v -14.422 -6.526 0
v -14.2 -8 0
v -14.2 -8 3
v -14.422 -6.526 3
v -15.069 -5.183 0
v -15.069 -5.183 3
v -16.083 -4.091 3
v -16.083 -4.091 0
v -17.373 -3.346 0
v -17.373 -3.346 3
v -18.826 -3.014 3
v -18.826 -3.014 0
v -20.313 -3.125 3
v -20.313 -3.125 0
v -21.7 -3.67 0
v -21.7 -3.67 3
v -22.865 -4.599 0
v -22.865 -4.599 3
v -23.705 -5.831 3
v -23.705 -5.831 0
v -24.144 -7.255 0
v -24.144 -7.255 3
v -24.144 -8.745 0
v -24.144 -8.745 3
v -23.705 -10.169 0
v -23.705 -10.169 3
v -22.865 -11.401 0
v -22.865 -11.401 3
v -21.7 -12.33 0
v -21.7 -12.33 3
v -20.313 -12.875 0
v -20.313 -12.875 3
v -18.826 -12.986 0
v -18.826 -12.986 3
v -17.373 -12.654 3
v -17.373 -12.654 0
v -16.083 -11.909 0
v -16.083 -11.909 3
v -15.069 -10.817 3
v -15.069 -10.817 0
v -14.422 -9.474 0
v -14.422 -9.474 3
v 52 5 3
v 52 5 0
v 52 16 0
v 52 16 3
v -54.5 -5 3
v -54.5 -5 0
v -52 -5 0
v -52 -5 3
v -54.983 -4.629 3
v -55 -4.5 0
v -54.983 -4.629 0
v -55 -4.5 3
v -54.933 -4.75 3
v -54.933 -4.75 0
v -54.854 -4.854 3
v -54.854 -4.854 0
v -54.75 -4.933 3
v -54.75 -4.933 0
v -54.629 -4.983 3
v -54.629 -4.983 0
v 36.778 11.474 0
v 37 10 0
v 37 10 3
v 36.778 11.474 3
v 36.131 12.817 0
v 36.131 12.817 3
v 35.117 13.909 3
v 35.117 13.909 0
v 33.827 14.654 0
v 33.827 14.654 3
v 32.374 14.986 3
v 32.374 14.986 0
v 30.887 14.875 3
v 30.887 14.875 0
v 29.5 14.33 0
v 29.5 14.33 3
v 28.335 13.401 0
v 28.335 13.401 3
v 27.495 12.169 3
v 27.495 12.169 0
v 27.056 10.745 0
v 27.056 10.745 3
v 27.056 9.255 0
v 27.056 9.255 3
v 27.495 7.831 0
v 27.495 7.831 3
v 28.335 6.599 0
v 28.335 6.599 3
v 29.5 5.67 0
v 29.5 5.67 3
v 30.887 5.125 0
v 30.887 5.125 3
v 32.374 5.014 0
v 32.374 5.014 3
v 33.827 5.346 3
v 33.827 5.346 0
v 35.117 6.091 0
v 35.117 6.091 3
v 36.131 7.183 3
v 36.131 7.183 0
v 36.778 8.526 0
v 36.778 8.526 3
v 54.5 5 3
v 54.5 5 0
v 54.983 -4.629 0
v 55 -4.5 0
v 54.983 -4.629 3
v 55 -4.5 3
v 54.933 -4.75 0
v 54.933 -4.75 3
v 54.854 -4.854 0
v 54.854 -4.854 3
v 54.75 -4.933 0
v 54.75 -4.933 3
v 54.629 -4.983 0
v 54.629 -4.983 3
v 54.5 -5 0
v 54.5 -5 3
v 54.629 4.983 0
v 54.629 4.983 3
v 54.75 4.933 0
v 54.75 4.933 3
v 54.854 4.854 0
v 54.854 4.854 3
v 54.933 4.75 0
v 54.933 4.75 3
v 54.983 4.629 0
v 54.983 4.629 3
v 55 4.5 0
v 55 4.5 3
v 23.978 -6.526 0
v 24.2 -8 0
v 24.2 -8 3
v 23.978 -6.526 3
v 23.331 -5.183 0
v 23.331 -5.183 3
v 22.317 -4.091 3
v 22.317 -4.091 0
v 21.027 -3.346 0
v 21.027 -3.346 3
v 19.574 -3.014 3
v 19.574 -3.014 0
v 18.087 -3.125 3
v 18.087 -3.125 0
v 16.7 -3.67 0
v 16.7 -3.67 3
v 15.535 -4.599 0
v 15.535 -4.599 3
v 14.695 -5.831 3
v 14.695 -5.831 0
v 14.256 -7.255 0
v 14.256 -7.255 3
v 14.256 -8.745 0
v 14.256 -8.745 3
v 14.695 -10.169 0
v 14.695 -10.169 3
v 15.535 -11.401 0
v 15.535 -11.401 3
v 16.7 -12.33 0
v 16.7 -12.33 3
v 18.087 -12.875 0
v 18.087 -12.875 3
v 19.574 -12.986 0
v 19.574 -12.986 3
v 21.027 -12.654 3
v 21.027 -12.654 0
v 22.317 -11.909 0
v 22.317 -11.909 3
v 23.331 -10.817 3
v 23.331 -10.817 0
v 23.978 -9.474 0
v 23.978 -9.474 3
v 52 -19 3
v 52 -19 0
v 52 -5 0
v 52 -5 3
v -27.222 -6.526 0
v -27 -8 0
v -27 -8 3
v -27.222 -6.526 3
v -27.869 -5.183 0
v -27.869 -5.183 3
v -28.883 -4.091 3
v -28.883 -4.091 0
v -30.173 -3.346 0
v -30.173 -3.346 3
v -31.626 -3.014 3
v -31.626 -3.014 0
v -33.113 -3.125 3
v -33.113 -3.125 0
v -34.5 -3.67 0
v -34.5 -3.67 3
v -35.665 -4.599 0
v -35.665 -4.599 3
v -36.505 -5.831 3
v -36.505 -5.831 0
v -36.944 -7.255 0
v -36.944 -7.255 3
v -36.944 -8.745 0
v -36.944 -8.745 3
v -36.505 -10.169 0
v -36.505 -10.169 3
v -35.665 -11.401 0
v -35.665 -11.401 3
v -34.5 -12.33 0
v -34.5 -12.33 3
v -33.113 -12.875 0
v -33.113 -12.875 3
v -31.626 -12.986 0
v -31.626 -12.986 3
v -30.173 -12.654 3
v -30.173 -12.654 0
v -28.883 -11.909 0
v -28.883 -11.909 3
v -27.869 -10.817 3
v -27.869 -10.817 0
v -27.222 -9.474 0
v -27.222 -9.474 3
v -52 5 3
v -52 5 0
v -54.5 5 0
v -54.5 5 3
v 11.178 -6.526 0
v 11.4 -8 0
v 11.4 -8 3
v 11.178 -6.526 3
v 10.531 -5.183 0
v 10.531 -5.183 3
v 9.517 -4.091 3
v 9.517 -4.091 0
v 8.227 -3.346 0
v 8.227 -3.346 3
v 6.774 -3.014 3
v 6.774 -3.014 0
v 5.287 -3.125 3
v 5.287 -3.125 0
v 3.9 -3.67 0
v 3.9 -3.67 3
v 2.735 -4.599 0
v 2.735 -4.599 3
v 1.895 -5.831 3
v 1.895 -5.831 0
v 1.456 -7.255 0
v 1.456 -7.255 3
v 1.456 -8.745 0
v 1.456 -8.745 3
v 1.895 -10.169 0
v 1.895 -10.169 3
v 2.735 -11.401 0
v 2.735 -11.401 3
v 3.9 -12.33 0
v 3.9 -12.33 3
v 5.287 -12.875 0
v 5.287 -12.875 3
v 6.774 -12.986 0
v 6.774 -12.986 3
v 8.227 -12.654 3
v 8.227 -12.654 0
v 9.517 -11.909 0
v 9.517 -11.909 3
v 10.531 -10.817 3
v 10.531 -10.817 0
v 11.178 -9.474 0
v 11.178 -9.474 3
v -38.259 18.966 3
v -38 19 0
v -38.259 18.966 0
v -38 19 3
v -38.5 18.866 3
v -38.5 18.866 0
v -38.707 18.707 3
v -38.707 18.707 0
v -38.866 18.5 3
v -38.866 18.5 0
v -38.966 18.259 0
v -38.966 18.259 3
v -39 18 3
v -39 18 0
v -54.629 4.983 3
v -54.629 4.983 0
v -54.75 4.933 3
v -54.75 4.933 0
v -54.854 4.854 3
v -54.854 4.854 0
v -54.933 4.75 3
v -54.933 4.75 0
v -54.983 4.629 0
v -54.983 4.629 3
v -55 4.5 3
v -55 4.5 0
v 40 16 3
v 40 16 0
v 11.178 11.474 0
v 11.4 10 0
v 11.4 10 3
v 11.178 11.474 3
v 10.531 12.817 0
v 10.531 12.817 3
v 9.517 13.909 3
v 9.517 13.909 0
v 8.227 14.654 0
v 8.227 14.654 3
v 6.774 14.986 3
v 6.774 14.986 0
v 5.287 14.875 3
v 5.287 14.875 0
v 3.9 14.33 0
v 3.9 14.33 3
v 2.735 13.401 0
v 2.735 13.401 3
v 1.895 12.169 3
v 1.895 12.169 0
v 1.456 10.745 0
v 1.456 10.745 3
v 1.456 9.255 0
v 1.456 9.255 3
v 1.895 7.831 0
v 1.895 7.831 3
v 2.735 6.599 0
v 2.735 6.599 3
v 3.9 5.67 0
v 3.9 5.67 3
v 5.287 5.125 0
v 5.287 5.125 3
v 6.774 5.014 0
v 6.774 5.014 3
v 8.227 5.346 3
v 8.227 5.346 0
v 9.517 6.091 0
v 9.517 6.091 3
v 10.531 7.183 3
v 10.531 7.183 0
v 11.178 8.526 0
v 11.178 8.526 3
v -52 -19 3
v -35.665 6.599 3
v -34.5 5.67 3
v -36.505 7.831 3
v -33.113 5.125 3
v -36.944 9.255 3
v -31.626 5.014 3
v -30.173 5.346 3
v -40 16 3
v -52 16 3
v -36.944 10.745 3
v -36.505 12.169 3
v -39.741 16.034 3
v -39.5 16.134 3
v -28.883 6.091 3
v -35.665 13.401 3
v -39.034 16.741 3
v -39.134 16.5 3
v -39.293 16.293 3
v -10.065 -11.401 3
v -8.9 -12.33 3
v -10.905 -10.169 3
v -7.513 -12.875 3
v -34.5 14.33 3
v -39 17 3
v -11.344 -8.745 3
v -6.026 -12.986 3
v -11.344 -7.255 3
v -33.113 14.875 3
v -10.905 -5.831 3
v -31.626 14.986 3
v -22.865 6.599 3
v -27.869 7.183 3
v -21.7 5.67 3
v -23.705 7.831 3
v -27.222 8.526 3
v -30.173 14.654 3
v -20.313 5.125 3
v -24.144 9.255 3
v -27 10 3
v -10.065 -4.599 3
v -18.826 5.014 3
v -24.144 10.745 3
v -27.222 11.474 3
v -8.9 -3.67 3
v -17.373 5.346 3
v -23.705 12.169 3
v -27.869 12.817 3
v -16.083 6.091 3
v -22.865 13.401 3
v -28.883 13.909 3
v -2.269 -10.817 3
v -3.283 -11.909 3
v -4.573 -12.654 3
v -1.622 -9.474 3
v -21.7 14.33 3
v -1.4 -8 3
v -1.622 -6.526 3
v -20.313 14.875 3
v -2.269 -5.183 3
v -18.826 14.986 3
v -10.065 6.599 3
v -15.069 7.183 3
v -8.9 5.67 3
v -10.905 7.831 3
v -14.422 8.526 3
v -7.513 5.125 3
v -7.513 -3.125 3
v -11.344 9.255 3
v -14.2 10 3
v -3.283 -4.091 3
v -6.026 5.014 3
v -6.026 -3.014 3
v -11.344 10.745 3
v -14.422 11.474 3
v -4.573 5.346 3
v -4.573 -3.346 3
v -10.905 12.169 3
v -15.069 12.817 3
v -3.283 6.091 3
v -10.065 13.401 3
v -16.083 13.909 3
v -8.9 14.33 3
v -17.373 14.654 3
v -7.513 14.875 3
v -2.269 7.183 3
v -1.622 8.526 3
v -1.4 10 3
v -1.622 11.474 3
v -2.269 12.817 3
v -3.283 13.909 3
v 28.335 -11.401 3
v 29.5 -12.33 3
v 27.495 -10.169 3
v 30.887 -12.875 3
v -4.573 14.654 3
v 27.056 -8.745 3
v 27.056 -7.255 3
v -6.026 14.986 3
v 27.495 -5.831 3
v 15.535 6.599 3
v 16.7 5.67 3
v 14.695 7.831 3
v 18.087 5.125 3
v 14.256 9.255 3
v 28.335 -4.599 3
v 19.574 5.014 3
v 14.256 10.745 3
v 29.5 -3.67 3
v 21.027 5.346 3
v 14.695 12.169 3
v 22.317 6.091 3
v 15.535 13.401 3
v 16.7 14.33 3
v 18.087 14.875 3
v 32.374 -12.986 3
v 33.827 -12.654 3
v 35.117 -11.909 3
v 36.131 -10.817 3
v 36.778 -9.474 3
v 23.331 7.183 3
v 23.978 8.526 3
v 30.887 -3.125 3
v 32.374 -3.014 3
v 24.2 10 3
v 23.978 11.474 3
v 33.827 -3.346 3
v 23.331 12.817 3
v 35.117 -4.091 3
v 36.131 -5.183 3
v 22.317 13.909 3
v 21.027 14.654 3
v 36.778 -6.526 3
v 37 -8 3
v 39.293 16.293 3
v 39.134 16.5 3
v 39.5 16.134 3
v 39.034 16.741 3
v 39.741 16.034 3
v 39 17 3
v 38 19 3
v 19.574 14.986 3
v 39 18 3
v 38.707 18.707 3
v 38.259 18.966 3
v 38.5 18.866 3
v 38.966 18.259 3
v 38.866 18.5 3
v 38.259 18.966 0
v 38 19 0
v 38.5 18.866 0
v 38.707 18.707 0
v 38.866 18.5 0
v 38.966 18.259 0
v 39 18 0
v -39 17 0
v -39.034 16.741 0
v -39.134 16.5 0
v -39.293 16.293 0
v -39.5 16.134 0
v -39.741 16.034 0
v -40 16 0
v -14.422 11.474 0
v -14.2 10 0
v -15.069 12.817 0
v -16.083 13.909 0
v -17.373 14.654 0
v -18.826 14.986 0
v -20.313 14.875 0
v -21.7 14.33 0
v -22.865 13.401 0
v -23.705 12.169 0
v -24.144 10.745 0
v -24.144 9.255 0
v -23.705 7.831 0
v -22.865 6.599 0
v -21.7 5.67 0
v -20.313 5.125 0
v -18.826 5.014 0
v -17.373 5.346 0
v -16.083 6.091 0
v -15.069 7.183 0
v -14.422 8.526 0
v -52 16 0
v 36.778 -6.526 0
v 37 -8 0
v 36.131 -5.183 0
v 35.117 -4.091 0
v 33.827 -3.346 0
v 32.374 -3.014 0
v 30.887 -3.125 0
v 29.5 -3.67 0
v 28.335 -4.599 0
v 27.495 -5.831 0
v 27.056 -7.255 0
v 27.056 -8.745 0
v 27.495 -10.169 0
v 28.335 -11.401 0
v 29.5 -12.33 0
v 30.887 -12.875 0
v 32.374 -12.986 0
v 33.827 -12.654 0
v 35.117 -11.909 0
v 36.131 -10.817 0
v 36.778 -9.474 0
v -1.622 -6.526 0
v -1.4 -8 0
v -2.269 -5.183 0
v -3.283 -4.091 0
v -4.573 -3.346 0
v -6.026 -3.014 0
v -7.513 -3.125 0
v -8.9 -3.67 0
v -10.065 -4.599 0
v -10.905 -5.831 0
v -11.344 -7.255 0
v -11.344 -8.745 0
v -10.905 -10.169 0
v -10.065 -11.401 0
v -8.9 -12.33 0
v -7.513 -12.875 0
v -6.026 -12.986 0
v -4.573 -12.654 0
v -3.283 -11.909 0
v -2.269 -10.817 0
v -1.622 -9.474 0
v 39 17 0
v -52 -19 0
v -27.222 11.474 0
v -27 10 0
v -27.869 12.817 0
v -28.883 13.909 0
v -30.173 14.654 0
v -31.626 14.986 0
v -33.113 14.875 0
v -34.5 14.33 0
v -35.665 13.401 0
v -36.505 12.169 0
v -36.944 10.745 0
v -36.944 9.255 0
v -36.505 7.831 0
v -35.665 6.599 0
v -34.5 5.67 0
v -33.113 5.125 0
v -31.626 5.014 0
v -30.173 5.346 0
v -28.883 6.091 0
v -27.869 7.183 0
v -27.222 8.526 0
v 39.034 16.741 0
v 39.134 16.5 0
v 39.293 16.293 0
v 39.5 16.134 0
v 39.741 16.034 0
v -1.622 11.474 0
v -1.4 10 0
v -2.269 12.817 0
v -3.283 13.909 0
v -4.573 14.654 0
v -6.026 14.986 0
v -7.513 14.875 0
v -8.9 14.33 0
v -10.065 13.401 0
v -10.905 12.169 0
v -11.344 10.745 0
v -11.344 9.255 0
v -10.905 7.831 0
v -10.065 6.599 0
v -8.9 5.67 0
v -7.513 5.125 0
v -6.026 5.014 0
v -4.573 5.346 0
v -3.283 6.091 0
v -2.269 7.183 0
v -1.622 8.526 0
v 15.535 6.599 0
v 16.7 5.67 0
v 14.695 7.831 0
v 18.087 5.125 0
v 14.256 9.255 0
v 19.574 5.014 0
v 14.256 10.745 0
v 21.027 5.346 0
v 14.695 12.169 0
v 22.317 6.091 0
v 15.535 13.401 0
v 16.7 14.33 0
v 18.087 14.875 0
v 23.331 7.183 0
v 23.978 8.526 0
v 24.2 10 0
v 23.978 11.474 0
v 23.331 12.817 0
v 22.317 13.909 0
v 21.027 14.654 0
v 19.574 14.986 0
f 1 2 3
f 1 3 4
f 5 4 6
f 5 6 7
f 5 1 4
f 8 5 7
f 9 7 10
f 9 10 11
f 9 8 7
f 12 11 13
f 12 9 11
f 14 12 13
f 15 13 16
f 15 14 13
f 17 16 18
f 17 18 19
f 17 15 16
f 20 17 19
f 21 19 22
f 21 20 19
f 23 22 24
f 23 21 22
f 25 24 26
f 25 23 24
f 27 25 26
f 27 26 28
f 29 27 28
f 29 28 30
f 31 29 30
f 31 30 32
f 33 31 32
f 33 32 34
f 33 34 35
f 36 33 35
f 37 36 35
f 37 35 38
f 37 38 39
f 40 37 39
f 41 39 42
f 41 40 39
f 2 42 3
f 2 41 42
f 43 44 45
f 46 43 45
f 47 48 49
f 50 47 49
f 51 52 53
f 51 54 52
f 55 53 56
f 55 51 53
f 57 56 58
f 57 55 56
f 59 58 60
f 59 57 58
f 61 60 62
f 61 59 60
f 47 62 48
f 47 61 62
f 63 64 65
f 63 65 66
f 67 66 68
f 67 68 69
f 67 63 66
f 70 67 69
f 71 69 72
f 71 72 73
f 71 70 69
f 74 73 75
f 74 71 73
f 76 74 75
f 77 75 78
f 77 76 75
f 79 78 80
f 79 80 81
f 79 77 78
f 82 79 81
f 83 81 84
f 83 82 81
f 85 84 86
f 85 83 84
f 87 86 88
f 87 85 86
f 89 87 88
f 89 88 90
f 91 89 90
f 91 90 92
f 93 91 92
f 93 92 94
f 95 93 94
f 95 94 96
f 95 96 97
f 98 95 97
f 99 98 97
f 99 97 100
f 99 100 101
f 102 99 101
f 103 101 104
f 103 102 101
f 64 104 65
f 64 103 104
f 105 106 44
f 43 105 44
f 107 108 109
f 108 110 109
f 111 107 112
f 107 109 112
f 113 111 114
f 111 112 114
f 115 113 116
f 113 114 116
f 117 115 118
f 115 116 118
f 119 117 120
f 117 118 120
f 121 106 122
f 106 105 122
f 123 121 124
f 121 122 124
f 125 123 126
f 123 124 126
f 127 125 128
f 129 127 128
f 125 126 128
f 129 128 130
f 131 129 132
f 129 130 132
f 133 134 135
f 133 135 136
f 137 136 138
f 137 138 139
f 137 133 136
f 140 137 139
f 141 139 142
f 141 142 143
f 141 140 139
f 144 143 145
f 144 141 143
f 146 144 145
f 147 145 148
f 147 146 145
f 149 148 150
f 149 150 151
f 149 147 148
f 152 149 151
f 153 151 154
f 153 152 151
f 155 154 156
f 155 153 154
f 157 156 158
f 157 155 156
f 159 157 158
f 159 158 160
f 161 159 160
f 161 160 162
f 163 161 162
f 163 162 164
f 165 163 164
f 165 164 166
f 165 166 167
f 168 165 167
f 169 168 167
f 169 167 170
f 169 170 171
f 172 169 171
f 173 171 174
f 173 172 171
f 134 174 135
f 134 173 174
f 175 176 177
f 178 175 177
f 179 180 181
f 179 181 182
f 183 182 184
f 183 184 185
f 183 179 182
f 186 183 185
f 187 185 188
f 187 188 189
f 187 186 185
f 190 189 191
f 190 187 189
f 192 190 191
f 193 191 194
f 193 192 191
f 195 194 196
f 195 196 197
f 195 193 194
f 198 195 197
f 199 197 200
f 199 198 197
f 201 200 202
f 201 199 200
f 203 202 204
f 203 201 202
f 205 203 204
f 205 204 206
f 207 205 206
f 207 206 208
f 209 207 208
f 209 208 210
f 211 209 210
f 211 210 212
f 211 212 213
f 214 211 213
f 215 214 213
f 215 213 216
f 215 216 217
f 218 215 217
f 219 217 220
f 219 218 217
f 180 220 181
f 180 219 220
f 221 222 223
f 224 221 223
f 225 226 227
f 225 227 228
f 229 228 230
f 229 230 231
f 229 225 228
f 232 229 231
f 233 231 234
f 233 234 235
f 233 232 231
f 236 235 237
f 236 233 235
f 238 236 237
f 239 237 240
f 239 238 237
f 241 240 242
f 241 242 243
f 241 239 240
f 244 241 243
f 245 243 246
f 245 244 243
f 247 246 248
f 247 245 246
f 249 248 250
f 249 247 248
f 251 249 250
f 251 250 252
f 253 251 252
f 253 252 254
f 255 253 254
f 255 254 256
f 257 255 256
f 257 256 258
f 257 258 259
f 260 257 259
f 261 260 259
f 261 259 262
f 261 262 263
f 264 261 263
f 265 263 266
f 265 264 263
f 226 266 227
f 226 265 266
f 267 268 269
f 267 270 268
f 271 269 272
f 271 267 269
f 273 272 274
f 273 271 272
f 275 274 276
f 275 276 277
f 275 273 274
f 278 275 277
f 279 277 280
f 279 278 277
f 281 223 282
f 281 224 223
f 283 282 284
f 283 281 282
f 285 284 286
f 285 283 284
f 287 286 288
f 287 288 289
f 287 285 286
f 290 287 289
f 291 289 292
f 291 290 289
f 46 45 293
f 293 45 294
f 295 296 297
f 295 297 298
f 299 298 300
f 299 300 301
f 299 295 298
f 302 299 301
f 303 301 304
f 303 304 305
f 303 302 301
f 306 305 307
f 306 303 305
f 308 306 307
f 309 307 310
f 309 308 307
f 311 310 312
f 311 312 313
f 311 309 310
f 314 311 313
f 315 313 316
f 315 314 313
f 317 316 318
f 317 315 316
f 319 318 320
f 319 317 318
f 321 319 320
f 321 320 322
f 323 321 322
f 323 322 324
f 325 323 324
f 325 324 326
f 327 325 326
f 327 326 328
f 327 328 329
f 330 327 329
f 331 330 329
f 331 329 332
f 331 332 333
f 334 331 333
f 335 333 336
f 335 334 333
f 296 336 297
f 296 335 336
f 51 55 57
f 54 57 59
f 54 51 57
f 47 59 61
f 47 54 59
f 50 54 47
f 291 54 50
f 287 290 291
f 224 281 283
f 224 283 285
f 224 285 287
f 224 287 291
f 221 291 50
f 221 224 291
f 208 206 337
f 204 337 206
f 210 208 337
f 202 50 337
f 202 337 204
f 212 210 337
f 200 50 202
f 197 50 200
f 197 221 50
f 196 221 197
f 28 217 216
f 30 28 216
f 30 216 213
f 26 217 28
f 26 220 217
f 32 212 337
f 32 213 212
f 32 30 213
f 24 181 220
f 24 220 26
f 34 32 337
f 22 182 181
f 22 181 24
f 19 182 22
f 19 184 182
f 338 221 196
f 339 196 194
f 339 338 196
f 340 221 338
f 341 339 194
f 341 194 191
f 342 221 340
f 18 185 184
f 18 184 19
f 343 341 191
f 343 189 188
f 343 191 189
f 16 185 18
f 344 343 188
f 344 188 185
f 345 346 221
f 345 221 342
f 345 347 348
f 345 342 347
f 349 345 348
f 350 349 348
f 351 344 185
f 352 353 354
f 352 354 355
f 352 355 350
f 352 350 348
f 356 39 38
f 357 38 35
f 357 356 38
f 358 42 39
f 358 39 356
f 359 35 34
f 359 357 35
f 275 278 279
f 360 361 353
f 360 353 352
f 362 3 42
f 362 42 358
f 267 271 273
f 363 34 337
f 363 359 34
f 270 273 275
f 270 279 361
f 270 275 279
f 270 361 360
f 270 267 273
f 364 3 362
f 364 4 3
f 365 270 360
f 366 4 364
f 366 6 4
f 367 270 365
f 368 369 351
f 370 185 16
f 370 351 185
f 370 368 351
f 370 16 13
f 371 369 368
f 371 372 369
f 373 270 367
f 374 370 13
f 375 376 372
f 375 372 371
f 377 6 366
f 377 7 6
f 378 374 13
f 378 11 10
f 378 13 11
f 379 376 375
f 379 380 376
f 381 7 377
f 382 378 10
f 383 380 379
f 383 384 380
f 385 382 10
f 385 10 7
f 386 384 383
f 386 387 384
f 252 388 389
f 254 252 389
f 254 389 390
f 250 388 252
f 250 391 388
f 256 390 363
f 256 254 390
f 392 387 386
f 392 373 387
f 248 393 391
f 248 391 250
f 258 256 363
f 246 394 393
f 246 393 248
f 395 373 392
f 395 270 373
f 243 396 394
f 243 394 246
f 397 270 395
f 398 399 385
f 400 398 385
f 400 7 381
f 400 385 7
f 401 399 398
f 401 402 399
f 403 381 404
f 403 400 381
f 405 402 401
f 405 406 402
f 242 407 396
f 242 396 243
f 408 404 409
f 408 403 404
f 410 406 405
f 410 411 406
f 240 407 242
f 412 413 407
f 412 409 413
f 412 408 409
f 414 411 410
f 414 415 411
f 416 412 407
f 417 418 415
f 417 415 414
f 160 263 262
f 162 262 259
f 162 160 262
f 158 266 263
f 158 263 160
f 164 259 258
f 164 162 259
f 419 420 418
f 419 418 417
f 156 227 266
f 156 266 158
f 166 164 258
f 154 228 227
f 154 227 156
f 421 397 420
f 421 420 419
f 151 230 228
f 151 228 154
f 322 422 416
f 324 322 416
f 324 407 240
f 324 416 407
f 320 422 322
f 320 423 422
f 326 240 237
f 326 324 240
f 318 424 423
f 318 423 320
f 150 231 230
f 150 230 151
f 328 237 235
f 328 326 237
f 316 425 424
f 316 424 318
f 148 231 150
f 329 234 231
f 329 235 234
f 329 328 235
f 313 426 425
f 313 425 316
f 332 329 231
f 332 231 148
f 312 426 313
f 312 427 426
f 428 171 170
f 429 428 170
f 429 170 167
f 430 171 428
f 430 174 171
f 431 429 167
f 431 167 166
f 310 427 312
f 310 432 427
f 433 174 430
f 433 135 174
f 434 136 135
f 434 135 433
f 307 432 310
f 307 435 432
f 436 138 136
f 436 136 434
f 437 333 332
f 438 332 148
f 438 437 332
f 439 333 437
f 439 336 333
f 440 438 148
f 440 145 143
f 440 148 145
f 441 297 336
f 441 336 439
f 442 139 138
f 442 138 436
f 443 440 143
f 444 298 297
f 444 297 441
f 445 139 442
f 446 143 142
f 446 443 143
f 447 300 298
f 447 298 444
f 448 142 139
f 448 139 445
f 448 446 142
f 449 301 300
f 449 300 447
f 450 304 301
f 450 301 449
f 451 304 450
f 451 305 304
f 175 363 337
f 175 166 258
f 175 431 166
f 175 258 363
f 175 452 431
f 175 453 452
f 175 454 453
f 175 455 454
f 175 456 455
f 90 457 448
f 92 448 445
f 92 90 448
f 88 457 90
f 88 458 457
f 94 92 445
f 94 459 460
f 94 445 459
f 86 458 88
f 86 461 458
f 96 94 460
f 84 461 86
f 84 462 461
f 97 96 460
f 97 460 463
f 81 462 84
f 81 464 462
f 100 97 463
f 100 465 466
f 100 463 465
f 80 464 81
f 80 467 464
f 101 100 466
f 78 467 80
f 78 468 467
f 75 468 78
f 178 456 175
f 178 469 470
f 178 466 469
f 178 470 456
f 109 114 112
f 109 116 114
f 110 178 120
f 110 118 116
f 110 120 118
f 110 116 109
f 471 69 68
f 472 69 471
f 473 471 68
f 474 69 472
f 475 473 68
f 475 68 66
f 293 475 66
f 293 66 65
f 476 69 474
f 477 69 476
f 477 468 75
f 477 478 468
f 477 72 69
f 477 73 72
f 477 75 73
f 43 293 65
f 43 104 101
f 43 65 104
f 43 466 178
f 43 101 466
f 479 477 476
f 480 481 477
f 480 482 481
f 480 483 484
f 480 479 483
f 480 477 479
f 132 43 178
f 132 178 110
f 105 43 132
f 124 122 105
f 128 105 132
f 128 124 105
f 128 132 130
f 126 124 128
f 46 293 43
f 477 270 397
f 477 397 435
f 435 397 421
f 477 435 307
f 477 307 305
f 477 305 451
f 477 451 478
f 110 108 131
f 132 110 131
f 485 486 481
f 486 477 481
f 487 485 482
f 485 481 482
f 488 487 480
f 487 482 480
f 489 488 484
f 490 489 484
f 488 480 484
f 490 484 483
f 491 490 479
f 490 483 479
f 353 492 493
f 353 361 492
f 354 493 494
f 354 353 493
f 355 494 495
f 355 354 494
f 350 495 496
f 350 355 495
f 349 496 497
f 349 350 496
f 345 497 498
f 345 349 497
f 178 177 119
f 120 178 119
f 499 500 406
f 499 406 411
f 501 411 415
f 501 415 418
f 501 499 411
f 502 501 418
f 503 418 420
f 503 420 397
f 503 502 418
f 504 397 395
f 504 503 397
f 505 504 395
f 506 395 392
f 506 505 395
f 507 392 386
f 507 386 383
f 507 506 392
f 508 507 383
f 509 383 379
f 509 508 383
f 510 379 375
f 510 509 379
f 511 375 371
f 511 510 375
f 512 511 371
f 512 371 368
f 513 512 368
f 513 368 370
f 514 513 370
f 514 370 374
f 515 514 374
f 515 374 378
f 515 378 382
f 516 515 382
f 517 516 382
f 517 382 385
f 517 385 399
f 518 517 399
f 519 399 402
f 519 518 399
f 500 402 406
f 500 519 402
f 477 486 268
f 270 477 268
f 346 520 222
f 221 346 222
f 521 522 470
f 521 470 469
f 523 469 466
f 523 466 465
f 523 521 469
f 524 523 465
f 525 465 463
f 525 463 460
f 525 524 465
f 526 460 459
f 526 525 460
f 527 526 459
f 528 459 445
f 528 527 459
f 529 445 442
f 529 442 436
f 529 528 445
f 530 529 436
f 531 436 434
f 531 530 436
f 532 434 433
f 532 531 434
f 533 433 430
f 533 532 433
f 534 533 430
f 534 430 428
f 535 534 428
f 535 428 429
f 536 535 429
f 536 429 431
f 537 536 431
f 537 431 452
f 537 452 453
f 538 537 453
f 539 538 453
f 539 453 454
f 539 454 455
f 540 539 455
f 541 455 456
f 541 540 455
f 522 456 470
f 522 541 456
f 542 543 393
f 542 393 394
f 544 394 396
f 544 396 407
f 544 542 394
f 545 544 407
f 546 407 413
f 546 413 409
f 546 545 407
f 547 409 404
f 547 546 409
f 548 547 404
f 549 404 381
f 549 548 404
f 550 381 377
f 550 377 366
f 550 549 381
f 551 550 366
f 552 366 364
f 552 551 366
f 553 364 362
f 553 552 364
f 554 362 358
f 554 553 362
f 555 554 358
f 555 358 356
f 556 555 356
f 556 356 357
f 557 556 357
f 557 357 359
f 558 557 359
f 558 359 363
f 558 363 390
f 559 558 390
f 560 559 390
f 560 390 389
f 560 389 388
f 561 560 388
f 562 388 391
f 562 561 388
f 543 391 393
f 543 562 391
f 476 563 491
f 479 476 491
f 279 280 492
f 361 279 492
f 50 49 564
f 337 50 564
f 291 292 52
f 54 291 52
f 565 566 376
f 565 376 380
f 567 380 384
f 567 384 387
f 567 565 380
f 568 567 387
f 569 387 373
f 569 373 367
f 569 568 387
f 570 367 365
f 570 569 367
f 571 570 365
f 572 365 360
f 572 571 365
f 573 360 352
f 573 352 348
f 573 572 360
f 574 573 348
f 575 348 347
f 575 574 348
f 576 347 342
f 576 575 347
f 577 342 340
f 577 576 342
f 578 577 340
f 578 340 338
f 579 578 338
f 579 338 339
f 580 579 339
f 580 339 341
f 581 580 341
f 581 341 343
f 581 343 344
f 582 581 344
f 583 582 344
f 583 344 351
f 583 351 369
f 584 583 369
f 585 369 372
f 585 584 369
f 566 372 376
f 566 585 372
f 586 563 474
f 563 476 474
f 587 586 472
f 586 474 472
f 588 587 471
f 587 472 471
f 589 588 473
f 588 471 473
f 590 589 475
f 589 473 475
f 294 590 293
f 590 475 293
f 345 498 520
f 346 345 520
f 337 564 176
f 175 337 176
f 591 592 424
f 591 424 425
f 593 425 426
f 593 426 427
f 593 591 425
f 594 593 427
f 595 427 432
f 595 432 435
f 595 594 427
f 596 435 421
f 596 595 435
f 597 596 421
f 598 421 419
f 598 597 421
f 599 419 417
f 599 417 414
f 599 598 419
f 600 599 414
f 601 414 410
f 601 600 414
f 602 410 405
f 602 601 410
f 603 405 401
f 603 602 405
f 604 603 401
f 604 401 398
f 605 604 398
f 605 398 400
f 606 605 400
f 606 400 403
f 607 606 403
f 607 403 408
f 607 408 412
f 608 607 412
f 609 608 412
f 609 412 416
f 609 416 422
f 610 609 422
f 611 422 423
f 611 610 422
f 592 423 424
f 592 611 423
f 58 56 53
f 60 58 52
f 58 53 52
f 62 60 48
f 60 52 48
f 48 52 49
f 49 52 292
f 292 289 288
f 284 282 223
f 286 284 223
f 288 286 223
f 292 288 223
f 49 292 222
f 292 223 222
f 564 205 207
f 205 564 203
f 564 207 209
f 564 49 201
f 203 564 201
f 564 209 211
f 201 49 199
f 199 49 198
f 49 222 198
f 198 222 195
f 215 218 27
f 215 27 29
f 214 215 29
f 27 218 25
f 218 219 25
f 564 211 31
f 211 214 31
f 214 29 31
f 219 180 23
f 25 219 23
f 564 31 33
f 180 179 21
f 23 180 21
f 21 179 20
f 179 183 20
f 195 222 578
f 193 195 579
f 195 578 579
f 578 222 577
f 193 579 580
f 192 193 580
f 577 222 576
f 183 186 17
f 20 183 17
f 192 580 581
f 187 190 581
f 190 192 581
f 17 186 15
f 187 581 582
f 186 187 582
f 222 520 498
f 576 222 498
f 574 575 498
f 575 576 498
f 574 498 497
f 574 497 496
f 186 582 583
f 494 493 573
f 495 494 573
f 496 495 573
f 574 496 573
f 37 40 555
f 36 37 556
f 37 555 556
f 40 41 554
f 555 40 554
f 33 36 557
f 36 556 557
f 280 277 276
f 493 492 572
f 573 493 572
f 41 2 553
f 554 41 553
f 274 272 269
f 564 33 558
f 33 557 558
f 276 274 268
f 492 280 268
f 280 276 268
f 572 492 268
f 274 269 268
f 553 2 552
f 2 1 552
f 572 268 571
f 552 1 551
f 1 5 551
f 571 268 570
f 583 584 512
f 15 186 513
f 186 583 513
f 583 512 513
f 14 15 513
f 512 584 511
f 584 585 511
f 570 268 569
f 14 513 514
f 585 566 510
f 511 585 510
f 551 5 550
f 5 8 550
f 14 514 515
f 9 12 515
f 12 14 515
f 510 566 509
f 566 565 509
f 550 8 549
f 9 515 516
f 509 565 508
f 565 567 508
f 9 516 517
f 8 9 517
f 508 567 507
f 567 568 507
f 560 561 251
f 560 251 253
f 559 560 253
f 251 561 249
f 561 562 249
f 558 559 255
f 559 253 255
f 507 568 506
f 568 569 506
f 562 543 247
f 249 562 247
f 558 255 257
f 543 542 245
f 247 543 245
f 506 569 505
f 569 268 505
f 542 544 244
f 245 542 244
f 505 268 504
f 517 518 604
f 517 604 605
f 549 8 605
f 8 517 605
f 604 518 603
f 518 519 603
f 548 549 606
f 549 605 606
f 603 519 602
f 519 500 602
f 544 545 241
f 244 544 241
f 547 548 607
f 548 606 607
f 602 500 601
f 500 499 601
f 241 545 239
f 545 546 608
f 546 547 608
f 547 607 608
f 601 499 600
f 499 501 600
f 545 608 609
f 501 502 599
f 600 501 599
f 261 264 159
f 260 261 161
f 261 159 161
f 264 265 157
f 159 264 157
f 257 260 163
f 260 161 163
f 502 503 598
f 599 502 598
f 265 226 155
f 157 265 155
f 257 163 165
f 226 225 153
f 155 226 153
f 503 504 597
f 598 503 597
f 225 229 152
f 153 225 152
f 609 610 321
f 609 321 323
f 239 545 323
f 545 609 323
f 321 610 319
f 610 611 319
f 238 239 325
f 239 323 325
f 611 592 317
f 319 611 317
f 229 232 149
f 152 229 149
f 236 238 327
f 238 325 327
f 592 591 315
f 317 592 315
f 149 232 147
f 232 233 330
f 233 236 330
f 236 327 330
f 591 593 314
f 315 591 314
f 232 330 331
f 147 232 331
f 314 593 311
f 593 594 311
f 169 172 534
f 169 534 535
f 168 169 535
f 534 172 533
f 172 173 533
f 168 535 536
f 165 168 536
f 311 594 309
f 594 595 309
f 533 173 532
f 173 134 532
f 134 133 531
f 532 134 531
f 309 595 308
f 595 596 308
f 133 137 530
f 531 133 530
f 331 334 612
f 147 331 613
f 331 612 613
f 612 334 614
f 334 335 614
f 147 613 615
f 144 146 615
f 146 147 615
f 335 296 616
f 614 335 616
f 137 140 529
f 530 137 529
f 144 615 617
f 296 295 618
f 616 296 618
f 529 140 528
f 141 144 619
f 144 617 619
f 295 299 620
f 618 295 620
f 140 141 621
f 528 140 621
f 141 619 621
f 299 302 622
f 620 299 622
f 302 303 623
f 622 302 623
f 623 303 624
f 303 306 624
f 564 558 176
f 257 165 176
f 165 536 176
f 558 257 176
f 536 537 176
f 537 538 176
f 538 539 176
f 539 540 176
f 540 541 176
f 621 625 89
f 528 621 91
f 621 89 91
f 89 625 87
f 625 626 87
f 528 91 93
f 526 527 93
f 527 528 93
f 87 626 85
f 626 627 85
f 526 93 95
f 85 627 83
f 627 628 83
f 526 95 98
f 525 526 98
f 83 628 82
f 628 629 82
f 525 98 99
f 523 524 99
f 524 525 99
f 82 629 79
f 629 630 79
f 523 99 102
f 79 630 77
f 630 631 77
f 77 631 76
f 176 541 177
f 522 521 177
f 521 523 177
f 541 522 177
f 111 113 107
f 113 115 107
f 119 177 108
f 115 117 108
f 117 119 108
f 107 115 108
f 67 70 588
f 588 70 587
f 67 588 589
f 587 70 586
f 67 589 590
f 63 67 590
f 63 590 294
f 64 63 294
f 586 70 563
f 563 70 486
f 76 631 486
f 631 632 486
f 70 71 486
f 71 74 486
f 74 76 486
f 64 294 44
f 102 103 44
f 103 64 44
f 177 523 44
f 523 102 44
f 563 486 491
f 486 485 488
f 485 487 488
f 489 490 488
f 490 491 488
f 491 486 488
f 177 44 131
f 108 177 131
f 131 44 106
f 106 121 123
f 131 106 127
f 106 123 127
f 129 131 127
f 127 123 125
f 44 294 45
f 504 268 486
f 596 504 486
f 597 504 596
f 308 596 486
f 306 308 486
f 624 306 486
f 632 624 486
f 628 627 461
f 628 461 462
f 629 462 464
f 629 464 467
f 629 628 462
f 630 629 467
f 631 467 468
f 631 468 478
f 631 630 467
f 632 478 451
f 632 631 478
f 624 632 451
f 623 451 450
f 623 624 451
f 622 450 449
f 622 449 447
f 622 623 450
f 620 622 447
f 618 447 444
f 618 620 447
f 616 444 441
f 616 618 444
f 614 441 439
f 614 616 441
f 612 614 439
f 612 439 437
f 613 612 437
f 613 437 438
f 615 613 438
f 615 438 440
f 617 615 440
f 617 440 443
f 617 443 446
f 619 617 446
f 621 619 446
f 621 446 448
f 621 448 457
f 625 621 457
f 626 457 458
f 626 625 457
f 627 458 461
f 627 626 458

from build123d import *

# Parameters (mm, degrees)
SKETCH_1_R      = 5
EXTRUDE_1_DEPTH = 3
FILLET_1_R      = 0.5
FILLET_2_R      = 1
FILLET_3_R      = 1


with BuildPart() as part:
    # Эскиз1 → Бобышка-Вытянуть1 (new body)
    with BuildSketch(Plane.XY):
        Polygon((39, 19), (-39, 19), (-39, 16), (-52, 16), (-52, 5), (-55, 5), (-55, -5), (-52, -5), (-52, -19), (52, -19), (52, -5), (55, -5), (55, 5), (52, 5), (52, 16), (39, 16), align=None)
        with Locations((-32, -8)):
            Circle(SKETCH_1_R, mode=Mode.SUBTRACT)
        with Locations((-19.2, -8)):
            Circle(SKETCH_1_R, mode=Mode.SUBTRACT)
        with Locations((-6.4, -8)):
            Circle(SKETCH_1_R, mode=Mode.SUBTRACT)
        with Locations((6.4, -8)):
            Circle(SKETCH_1_R, mode=Mode.SUBTRACT)
        with Locations((19.2, -8)):
            Circle(SKETCH_1_R, mode=Mode.SUBTRACT)
        with Locations((32, -8)):
            Circle(SKETCH_1_R, mode=Mode.SUBTRACT)
        with Locations((-32, 10)):
            Circle(SKETCH_1_R, mode=Mode.SUBTRACT)
        with Locations((-19.2, 10)):
            Circle(SKETCH_1_R, mode=Mode.SUBTRACT)
        with Locations((-6.4, 10)):
            Circle(SKETCH_1_R, mode=Mode.SUBTRACT)
        with Locations((6.4, 10)):
            Circle(SKETCH_1_R, mode=Mode.SUBTRACT)
        with Locations((19.2, 10)):
            Circle(SKETCH_1_R, mode=Mode.SUBTRACT)
        with Locations((32, 10)):
            Circle(SKETCH_1_R, mode=Mode.SUBTRACT)
    extrude(amount=EXTRUDE_1_DEPTH)

    # Скругление1
    fillet_1_edges = [part.edges().sort_by_distance(p)[0] for p in [
        (55, 5, 1.5),
        (55, -5, 1.5),
        (-55, -5, 1.5),
        (-55, 5, 1.5),
    ]]
    fillet(fillet_1_edges, radius=FILLET_1_R)

    # Скругление2
    fillet_2_edges = [part.edges().sort_by_distance(p)[0] for p in [
        (-39, 16, 1.5),
        (-39, 19, 1.5),
    ]]
    fillet(fillet_2_edges, radius=FILLET_2_R)

    # Скругление3
    fillet_3_edges = [part.edges().sort_by_distance(p)[0] for p in [
        (39, 19, 1.5),
        (39, 16, 1.5),
    ]]
    fillet(fillet_3_edges, radius=FILLET_3_R)


solid = part.part
